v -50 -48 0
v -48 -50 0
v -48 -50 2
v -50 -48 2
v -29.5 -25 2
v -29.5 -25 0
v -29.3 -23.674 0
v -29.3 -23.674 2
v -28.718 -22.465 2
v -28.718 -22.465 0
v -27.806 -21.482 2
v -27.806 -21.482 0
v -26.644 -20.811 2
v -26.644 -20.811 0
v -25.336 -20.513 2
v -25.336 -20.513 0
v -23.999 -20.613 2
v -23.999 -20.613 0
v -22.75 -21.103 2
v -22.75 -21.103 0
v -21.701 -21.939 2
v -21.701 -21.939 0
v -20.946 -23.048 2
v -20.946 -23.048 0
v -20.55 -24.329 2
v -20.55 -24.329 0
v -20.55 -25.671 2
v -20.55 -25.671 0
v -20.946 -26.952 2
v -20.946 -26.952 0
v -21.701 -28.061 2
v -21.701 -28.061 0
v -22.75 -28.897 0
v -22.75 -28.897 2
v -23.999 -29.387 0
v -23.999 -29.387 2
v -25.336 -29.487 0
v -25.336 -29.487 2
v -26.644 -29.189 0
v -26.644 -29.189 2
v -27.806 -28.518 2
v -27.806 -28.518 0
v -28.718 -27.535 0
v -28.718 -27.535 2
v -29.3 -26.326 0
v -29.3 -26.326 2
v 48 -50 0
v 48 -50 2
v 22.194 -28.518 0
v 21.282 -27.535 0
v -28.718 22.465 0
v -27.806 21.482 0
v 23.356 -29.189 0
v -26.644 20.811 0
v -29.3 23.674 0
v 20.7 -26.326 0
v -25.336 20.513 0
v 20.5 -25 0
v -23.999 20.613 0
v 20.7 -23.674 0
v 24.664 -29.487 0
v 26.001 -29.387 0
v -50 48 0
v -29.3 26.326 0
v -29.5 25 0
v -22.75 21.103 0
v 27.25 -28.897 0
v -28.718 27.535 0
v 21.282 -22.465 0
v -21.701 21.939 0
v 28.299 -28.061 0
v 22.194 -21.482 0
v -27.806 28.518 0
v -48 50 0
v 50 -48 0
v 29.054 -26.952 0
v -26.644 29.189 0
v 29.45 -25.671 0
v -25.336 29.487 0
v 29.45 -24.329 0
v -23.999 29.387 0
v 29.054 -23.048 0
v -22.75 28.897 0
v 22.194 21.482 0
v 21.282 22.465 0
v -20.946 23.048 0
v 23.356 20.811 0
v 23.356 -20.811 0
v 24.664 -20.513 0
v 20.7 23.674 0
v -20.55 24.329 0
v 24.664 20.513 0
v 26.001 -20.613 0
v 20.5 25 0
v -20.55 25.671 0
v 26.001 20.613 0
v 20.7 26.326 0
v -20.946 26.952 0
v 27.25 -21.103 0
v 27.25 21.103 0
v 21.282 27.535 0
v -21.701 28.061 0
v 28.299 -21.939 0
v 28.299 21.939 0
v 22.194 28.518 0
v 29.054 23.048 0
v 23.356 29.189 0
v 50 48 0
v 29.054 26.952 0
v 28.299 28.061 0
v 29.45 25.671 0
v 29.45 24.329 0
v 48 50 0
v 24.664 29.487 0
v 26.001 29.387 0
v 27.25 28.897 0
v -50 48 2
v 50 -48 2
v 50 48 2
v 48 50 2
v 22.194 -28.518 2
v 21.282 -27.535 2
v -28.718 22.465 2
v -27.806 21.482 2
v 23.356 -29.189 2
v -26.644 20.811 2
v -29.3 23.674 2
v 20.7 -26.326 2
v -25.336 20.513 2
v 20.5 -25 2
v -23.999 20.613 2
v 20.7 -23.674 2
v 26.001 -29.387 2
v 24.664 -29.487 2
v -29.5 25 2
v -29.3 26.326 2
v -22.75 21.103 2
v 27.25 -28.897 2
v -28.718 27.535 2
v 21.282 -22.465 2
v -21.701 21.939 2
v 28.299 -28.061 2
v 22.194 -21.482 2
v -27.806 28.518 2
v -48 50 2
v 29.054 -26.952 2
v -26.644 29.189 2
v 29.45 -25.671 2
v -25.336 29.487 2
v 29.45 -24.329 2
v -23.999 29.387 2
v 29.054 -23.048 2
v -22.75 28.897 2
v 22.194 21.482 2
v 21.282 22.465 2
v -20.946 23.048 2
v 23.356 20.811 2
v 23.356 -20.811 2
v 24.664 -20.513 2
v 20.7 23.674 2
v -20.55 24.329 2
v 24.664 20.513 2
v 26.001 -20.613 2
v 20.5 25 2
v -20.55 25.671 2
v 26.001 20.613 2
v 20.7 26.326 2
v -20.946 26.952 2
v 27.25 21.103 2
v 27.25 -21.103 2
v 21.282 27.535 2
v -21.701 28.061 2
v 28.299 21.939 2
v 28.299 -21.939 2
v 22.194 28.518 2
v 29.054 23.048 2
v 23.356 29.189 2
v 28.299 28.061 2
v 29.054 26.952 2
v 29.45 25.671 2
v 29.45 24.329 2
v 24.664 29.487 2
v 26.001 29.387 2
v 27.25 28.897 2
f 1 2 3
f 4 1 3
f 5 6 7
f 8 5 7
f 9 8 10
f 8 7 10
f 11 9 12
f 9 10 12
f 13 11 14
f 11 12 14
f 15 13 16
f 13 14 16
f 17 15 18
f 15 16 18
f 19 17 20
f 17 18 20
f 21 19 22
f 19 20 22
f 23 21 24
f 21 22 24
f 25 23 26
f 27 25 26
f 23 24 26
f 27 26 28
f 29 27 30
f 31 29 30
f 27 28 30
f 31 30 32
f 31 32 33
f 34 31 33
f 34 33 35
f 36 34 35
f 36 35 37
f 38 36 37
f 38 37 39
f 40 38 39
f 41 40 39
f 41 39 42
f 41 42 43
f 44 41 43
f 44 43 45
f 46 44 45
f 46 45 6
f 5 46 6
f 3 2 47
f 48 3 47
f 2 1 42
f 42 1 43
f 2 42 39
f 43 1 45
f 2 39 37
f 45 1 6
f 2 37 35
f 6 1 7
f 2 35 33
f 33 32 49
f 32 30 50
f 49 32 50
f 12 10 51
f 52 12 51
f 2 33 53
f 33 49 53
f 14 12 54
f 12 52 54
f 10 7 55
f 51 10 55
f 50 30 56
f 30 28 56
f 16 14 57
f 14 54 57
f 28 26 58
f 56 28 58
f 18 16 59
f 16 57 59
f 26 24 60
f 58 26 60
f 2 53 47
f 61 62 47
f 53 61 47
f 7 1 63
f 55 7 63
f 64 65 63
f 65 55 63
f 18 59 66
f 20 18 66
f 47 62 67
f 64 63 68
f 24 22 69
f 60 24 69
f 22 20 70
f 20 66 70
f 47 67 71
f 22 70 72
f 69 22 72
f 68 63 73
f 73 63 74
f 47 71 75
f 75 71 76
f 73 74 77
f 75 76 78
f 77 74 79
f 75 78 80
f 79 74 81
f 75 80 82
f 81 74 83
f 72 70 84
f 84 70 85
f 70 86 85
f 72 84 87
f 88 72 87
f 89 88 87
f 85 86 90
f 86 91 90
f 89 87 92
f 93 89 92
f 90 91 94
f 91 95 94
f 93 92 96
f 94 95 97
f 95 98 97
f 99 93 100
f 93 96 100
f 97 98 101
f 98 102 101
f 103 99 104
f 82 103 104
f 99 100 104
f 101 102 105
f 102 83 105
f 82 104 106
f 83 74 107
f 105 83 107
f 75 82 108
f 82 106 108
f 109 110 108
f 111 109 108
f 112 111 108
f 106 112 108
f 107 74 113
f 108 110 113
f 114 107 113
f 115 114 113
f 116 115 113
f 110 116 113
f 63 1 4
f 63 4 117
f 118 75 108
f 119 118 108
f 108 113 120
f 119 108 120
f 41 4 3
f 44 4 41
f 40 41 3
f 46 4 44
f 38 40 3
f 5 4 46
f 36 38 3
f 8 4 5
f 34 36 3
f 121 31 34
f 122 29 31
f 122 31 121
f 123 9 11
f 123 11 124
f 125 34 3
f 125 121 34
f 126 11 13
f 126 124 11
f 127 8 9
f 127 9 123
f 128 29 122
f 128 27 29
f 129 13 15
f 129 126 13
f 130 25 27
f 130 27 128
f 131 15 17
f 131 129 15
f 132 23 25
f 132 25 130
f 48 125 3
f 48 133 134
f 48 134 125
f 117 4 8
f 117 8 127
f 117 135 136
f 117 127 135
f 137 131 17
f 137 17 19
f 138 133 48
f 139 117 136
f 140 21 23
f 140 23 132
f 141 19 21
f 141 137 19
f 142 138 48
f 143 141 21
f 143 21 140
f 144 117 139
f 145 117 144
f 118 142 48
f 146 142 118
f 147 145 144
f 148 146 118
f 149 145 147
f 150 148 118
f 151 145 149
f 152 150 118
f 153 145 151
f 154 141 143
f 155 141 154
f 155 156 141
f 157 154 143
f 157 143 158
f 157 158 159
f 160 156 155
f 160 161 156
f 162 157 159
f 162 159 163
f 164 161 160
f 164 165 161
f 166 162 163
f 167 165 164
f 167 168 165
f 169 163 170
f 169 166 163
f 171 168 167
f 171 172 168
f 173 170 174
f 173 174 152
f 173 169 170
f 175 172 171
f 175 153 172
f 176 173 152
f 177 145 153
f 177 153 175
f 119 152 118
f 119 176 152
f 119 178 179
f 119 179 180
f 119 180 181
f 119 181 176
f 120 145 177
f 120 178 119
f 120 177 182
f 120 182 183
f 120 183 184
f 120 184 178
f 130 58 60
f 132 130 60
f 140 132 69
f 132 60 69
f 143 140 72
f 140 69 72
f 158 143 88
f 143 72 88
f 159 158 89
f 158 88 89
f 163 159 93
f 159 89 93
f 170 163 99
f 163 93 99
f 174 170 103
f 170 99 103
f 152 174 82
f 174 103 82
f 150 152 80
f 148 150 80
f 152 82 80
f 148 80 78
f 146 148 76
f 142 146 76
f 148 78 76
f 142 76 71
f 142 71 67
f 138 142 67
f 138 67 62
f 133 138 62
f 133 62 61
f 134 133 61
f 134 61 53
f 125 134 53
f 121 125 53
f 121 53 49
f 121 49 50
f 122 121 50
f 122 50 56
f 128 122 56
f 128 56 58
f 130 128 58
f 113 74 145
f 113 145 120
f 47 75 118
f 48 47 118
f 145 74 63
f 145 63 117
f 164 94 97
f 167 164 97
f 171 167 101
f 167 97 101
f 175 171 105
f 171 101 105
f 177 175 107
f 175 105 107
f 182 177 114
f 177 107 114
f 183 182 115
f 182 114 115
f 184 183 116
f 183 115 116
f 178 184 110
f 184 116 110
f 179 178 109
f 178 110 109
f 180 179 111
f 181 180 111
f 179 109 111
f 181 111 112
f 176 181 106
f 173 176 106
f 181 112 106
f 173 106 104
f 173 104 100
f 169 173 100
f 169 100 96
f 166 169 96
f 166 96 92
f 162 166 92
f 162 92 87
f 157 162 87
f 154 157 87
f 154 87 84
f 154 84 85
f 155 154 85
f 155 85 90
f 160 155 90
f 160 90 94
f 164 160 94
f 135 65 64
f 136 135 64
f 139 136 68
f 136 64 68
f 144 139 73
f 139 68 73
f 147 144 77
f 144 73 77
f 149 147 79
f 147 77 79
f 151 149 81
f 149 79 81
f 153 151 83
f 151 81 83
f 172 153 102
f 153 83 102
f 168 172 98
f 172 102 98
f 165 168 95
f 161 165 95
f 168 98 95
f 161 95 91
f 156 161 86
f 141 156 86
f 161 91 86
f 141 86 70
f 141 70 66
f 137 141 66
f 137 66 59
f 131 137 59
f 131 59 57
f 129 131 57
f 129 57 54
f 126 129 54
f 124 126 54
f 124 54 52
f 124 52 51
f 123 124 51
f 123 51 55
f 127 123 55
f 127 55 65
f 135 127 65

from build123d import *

# Parameters (mm, degrees)
SKETCH_1_W        = 100
SKETCH_1_H        = 100
EXTRUDE_1_DEPTH   = 2
CHAMFER_1_SIZE    = 2
HOLE_WIZARD_M81_D = 9


with BuildPart() as part:
    # Эскиз1 → Бобышка-Вытянуть1 (new body)
    with BuildSketch(Plane.XY):
        Rectangle(SKETCH_1_W, SKETCH_1_H)
    extrude(amount=EXTRUDE_1_DEPTH)

    # Фаска1
    chamfer_1_edges = [part.edges().sort_by_distance(p)[0] for p in [
        (50, -50, 1),
        (-50, -50, 1),
        (-50, 50, 1),
        (50, 50, 1),
    ]]
    chamfer(chamfer_1_edges, length=CHAMFER_1_SIZE)

    # Отверстие с зазором M81 (through all)
    with Locations(Plane.XY.offset(2)):
        with Locations((-25, 25), (25, 25), (-25, -25), (25, -25)):
            Hole(HOLE_WIZARD_M81_D / 2)


solid = part.part
